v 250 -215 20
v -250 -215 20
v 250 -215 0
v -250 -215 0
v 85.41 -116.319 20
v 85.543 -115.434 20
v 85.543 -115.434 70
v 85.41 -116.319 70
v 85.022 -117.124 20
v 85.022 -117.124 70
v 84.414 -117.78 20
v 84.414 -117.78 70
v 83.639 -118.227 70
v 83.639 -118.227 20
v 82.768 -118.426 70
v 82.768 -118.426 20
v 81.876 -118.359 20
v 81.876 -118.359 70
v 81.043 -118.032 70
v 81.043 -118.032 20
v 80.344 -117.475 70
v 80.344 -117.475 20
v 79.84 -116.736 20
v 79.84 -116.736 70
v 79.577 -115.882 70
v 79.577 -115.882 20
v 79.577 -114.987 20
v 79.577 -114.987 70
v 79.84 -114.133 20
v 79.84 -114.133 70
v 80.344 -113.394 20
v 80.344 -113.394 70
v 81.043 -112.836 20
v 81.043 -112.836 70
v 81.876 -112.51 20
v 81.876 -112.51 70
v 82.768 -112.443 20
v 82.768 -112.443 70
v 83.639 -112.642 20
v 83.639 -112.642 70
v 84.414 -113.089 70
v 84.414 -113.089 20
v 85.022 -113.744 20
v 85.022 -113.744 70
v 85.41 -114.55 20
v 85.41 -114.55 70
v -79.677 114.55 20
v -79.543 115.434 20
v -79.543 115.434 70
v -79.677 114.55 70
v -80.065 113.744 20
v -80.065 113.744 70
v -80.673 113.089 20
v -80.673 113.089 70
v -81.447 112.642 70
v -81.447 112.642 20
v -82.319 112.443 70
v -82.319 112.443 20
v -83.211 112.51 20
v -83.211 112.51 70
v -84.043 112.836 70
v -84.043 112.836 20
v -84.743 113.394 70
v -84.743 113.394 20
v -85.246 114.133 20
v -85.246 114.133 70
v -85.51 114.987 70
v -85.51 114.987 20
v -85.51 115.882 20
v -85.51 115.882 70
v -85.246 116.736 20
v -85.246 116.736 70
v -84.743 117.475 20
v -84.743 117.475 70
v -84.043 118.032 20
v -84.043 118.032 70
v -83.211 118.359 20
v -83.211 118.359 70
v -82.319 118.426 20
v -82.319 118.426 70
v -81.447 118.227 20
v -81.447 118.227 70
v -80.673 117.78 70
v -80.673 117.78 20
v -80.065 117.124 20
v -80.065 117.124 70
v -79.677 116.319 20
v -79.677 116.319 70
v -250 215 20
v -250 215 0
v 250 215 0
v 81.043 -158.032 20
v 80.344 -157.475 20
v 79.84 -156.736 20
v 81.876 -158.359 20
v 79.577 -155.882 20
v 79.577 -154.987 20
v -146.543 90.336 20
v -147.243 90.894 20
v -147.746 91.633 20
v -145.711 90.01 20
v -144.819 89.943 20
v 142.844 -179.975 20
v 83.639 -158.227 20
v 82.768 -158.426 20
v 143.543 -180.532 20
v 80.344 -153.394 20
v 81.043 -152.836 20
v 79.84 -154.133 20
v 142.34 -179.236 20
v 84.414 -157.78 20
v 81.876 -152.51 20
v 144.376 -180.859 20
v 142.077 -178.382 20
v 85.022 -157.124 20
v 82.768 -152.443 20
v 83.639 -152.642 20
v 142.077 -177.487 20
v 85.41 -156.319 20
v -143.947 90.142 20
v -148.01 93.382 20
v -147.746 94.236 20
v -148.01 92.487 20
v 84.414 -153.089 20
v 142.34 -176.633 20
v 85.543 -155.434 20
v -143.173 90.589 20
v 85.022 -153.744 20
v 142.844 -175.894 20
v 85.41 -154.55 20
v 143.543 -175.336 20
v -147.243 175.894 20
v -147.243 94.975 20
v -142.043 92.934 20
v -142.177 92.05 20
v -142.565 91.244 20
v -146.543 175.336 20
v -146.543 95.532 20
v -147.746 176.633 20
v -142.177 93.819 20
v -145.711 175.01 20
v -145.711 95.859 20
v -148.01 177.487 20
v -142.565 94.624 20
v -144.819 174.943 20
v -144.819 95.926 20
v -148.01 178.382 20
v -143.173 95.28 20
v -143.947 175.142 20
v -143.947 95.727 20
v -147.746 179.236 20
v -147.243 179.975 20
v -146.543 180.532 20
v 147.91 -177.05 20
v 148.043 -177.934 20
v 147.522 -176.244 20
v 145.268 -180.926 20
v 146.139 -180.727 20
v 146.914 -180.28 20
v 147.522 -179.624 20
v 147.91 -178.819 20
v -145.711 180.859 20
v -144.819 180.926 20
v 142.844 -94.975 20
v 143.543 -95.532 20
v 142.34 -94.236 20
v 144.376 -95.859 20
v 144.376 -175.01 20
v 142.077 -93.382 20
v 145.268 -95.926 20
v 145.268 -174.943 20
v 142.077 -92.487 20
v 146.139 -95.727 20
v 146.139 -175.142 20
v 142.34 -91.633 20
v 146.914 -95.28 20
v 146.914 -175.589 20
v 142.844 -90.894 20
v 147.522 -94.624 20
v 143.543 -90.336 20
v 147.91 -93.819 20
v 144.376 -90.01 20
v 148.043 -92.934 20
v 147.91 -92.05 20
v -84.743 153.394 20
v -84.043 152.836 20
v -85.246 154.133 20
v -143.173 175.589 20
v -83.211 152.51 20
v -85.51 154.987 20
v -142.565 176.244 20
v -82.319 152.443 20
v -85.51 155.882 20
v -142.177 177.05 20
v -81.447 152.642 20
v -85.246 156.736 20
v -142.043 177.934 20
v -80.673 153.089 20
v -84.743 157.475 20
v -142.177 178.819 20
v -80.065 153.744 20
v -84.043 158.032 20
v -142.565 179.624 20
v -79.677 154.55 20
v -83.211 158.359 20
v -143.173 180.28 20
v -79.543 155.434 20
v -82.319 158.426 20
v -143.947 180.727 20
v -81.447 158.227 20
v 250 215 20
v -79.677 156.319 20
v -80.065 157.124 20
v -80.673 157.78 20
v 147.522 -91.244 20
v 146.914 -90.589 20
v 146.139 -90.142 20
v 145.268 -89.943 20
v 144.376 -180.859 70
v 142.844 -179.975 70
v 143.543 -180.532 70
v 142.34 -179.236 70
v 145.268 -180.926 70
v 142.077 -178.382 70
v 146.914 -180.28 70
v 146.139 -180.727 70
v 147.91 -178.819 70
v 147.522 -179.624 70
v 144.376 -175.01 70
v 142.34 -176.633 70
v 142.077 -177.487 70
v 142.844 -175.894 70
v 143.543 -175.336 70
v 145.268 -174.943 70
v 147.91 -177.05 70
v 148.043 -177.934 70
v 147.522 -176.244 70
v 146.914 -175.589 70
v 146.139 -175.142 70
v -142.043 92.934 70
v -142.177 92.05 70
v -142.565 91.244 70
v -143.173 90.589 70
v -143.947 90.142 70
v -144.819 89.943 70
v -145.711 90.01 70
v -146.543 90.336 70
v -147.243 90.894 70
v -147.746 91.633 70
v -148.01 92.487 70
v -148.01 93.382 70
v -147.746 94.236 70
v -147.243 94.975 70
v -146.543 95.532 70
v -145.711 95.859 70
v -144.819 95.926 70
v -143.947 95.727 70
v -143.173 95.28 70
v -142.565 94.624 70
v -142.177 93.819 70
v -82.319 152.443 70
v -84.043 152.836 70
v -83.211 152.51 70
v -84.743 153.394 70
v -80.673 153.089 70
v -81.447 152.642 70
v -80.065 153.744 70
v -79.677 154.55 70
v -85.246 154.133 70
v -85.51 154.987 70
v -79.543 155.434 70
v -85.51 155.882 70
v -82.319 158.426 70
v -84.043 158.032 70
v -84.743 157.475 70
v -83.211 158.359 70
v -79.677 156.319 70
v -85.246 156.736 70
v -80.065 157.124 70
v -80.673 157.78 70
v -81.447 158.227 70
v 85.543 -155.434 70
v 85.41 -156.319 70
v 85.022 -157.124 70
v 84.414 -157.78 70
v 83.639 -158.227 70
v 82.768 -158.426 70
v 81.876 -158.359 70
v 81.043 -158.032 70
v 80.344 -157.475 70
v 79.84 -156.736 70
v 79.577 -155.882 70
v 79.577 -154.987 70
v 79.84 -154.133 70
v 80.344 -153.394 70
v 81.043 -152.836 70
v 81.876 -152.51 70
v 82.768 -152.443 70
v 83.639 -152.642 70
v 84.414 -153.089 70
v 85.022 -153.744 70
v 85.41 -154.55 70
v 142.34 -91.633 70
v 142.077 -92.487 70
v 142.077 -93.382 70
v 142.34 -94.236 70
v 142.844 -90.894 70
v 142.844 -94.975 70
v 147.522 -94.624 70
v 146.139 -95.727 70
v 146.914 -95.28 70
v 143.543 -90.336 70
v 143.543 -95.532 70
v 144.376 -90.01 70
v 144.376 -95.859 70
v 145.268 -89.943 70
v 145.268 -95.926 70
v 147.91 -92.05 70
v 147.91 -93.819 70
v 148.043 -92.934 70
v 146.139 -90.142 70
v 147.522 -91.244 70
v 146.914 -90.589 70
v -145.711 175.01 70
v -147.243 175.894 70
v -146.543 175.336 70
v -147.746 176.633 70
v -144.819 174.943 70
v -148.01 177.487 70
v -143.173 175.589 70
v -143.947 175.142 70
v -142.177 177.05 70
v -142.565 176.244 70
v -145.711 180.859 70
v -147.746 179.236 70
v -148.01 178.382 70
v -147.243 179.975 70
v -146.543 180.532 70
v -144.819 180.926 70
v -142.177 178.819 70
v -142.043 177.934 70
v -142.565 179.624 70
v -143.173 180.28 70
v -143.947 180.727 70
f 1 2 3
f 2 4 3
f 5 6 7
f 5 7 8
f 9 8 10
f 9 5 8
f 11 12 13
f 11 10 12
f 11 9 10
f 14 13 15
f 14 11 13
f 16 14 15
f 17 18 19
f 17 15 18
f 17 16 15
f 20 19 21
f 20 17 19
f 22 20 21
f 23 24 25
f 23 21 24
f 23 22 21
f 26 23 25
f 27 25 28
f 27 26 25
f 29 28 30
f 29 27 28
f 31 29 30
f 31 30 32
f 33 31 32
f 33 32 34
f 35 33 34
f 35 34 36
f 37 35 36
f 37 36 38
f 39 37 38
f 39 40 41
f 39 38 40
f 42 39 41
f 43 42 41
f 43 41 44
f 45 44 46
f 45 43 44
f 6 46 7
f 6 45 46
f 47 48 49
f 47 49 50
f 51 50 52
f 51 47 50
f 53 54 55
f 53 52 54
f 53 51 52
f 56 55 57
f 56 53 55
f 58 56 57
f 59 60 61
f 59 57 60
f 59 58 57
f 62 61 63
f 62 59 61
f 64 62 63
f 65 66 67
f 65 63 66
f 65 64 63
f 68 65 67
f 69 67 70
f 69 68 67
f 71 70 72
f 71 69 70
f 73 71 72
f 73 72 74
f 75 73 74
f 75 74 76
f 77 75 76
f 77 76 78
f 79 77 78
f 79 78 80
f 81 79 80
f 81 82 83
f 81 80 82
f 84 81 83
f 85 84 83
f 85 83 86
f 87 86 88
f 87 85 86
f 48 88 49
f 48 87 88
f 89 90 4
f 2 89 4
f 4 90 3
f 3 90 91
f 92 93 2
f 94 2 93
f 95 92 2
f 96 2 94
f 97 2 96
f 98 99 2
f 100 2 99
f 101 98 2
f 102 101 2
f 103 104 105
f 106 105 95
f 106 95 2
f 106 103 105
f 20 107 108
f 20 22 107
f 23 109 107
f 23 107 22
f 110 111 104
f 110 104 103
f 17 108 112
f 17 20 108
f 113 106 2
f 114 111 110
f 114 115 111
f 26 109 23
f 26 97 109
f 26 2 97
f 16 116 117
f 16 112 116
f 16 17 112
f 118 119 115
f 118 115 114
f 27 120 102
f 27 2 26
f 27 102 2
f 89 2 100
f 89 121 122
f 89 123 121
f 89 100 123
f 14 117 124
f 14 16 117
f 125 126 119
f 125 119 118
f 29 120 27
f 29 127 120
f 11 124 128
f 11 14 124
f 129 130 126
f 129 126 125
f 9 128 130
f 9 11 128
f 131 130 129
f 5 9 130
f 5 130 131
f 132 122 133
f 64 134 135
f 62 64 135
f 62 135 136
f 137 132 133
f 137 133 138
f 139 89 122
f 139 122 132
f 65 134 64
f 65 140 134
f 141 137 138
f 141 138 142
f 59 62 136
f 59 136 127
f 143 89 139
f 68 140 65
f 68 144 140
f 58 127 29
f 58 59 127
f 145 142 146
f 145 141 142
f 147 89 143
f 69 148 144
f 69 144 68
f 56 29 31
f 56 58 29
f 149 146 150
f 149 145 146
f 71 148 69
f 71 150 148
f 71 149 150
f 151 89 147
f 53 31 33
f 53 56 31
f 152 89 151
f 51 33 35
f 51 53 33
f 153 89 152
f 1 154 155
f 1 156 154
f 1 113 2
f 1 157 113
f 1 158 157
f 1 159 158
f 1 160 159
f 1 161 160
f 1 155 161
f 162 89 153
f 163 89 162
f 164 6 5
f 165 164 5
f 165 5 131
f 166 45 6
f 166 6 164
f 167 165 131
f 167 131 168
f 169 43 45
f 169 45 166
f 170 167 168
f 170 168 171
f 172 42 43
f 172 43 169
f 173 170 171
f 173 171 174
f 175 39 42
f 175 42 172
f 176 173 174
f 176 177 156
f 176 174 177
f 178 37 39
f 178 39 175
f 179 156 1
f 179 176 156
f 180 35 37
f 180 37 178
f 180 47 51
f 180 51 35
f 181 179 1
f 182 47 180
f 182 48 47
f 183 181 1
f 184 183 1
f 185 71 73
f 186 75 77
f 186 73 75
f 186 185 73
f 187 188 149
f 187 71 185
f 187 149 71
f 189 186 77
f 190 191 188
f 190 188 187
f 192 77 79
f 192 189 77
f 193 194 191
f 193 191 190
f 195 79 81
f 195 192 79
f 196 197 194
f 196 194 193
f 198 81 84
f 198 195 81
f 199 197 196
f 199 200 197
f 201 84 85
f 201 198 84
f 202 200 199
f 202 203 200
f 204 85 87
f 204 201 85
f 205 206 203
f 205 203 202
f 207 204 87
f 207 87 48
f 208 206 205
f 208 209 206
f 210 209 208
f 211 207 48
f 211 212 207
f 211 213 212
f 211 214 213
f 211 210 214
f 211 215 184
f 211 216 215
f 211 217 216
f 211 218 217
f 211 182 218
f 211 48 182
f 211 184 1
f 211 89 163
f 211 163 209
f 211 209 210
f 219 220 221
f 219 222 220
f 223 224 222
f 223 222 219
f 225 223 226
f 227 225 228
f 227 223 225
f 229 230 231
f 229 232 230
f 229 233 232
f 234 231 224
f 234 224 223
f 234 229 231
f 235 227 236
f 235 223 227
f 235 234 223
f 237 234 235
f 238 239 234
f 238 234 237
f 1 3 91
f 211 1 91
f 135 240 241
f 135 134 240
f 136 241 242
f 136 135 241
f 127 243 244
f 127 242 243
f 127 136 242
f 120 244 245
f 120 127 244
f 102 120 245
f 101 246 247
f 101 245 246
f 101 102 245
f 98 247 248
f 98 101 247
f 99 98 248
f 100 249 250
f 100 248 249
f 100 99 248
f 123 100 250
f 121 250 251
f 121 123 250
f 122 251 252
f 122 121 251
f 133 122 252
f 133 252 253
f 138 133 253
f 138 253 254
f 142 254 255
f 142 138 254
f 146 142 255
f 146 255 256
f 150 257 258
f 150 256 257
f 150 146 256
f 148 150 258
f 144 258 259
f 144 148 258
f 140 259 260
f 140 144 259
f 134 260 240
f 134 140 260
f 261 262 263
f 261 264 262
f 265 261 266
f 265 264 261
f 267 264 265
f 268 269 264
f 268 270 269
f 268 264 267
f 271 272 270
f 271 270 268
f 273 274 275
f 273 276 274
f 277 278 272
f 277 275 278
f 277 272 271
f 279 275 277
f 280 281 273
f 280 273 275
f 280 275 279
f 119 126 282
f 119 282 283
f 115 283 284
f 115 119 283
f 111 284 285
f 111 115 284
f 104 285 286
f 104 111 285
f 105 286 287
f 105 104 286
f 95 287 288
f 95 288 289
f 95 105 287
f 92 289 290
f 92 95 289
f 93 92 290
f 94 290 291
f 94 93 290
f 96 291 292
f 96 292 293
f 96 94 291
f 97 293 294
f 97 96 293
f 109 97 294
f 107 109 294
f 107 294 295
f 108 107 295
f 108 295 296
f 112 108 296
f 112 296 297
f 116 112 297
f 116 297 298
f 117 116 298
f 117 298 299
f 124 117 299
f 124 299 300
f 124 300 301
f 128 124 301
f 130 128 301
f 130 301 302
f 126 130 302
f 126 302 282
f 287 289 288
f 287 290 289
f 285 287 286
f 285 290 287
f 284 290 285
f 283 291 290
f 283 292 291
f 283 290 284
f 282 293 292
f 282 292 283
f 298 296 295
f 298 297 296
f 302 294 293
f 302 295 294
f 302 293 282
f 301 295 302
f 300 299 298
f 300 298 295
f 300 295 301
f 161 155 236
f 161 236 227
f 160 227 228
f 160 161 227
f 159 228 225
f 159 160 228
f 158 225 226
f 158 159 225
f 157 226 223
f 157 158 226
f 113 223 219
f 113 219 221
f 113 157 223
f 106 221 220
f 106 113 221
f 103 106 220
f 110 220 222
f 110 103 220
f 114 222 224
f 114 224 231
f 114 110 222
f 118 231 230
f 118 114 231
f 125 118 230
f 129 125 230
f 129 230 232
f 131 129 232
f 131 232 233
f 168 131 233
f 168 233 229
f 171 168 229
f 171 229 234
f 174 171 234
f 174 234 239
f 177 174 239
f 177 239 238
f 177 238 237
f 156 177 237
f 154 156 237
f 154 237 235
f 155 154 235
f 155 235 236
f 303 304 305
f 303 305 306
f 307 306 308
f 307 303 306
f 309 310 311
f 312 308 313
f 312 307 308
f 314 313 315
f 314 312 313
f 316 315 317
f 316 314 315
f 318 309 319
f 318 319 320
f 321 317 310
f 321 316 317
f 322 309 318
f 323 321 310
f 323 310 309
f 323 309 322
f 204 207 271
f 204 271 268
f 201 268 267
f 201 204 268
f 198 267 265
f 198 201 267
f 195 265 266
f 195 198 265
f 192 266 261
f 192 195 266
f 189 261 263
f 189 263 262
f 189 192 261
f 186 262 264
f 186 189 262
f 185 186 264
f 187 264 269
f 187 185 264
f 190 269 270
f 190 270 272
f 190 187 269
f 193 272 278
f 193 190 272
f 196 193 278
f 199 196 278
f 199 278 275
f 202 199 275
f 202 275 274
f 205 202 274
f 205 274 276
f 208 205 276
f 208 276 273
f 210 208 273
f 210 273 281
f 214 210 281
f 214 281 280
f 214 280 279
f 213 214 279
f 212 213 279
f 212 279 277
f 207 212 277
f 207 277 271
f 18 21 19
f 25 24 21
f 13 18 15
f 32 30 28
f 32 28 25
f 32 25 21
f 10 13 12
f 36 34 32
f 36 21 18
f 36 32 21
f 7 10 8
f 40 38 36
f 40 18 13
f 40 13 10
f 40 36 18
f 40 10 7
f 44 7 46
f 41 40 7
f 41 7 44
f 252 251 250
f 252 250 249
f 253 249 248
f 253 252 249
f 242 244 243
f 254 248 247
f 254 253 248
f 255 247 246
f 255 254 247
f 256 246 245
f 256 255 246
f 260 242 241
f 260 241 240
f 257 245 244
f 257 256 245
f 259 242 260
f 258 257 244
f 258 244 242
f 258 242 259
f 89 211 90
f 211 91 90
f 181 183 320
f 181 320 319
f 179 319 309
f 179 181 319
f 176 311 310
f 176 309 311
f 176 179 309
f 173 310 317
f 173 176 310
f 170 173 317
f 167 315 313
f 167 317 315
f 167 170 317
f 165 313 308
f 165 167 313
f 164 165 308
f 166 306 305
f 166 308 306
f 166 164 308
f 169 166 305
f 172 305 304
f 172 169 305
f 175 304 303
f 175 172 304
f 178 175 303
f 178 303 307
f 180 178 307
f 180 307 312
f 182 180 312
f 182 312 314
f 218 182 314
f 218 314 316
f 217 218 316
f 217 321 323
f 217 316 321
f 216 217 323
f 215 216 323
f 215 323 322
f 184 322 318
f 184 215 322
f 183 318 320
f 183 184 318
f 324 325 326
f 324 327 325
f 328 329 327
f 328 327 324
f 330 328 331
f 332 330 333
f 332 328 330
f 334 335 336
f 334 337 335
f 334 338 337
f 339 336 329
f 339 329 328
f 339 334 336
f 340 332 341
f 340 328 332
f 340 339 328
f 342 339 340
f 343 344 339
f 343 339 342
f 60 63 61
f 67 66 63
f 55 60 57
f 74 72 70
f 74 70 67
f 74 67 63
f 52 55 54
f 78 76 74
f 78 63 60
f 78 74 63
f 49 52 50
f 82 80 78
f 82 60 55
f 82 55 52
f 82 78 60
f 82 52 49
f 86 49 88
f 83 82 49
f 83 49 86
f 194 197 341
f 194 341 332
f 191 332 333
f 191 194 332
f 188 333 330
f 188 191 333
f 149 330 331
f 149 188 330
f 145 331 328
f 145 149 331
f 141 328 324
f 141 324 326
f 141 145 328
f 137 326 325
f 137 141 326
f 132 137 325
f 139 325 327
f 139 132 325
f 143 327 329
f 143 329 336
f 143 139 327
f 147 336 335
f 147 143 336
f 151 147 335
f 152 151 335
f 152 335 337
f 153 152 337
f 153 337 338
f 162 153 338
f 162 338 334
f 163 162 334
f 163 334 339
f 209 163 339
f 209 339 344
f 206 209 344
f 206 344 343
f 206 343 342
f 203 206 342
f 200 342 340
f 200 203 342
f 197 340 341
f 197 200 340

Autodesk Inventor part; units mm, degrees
ref_plane "YZ Plane" through (0, 0, 0) normal (1, 0, 0) x (0, 1, 0)
ref_plane "XZ Plane" through (0, 0, 0) normal (0, 1, 0) x (-1, 0, 0)
ref_plane "XY Plane" through (0, 0, 0) normal (0, 0, 1) x (1, 0, 0)
sketch "Boceto1" plane through (0, 0, 0) normal (0, 0, 1) x (1, 0, 0)
  line L0 (-250, -215) -> (250, -215)
  line L1 (250, -215) -> (250, 215)
  line L2 (250, 215) -> (-250, 215)
  line L3 (-250, 215) -> (-250, -215)
  line L4 (-250, -215) -> (250, 215) construction
  line L5 (250, -215) -> (-250, 215) construction
  point P0 (0, 0)
  dimension "d0" = 500
  dimension "d1" = 430
extrude "Extrusión1" add sketch "Boceto1" along normal blind 20
sketch "Boceto7" plane through (0, 0, 20) normal (0, 0, 1) x (1, 0, 0)
  line L0 (-135.0434, 135.4344) -> (-155.0434, 135.4344)
  line L1 (-155.0434, 170.4344) -> (-155.0434, 100.4344)
  line L2 (-145.0434, 135.4344) -> (-145.0434, 185.4344)
  line L3 (-70.0434, 185.4344) -> (-200.0434, 185.4344)
  line L4 (-145.0434, 170.4344) -> (-145.0434, 185.4344)
  line L5 (-145.0434, 185.4344) -> (-145.0434, 177.9344)
  line L6 (-145.0434, 135.4344) -> (-70.0434, 135.4344)
  line L7 (-70.0434, 85.4344) -> (-70.0434, 185.4344)
  line L8 (-95.0434, 170.4344) -> (-95.0434, 100.4344)
  line L9 (-95.0434, 135.4344) -> (-70.0434, 135.4344)
  line L10 (-82.5434, 135.4344) -> (-82.5434, 155.4344)
  circle A0 centre (-145.0434, 177.9344) radius 3
  circle A1 centre (-82.5434, 155.4344) radius 3
  circle A2 centre (-145.0434, 92.9344) radius 3
  circle A3 centre (-82.5434, 115.4344) radius 3
  line L11 (-250, 215) -> (-250, -215) projected
  line L12 (-250, 215) -> (-200, 215)
  line L13 (-200, 215) -> (-200, 185)
  line L14 (-250, 0) -> (0, 0)
  line L15 (250, -215) -> (-250, -215)
  line L16 (135.0434, -135.4344) -> (155.0434, -135.4344)
  line L17 (155.0434, -170.4344) -> (155.0434, -100.4344)
  line L18 (145.0434, -135.4344) -> (70.0434, -135.4344)
  line L19 (-250, -215) -> (250, -215)
  line L20 (70.0434, -185.4344) -> (200.0434, -185.4344)
  line L21 (145.0434, -185.4344) -> (145.0434, -177.9344)
  line L22 (145.0434, -170.4344) -> (145.0434, -185.4344)
  circle A4 centre (145.0434, -177.9344) radius 3
  circle A5 centre (145.0434, -92.9344) radius 3
  line L23 (200, -215) -> (200, -185)
  line L24 (145.0434, -135.4344) -> (145.0434, -185.4344)
  line L25 (250, -215) -> (200, -215)
  line L26 (95.0434, -170.4344) -> (95.0434, -100.4344)
  line L27 (70.0434, -85.4344) -> (70.0434, -185.4344)
  circle A6 centre (82.5434, -115.4344) radius 3
  line L28 (82.5434, -135.4344) -> (82.5434, -155.4344)
  circle A7 centre (82.5434, -155.4344) radius 3
  line L29 (95.0434, -135.4344) -> (70.0434, -135.4344)
  point P0 (250, 215)
  dimension "d22" = 20
  dimension "d23" = 6
  dimension "d24" = 6
  dimension "d25" = 50
  dimension "d26" = 30
extrude "Extrusión7" add sketch "Boceto7" along normal blind 50 contours A1 | A0 L2 | L2 A0 | A2 | A3
extrude "Extrusión8" add sketch "Boceto7" along normal blind 50 contours A7 | A4 L22 L21 | L21 L22 A4 | A5 | A6
properties part number "Placa"
